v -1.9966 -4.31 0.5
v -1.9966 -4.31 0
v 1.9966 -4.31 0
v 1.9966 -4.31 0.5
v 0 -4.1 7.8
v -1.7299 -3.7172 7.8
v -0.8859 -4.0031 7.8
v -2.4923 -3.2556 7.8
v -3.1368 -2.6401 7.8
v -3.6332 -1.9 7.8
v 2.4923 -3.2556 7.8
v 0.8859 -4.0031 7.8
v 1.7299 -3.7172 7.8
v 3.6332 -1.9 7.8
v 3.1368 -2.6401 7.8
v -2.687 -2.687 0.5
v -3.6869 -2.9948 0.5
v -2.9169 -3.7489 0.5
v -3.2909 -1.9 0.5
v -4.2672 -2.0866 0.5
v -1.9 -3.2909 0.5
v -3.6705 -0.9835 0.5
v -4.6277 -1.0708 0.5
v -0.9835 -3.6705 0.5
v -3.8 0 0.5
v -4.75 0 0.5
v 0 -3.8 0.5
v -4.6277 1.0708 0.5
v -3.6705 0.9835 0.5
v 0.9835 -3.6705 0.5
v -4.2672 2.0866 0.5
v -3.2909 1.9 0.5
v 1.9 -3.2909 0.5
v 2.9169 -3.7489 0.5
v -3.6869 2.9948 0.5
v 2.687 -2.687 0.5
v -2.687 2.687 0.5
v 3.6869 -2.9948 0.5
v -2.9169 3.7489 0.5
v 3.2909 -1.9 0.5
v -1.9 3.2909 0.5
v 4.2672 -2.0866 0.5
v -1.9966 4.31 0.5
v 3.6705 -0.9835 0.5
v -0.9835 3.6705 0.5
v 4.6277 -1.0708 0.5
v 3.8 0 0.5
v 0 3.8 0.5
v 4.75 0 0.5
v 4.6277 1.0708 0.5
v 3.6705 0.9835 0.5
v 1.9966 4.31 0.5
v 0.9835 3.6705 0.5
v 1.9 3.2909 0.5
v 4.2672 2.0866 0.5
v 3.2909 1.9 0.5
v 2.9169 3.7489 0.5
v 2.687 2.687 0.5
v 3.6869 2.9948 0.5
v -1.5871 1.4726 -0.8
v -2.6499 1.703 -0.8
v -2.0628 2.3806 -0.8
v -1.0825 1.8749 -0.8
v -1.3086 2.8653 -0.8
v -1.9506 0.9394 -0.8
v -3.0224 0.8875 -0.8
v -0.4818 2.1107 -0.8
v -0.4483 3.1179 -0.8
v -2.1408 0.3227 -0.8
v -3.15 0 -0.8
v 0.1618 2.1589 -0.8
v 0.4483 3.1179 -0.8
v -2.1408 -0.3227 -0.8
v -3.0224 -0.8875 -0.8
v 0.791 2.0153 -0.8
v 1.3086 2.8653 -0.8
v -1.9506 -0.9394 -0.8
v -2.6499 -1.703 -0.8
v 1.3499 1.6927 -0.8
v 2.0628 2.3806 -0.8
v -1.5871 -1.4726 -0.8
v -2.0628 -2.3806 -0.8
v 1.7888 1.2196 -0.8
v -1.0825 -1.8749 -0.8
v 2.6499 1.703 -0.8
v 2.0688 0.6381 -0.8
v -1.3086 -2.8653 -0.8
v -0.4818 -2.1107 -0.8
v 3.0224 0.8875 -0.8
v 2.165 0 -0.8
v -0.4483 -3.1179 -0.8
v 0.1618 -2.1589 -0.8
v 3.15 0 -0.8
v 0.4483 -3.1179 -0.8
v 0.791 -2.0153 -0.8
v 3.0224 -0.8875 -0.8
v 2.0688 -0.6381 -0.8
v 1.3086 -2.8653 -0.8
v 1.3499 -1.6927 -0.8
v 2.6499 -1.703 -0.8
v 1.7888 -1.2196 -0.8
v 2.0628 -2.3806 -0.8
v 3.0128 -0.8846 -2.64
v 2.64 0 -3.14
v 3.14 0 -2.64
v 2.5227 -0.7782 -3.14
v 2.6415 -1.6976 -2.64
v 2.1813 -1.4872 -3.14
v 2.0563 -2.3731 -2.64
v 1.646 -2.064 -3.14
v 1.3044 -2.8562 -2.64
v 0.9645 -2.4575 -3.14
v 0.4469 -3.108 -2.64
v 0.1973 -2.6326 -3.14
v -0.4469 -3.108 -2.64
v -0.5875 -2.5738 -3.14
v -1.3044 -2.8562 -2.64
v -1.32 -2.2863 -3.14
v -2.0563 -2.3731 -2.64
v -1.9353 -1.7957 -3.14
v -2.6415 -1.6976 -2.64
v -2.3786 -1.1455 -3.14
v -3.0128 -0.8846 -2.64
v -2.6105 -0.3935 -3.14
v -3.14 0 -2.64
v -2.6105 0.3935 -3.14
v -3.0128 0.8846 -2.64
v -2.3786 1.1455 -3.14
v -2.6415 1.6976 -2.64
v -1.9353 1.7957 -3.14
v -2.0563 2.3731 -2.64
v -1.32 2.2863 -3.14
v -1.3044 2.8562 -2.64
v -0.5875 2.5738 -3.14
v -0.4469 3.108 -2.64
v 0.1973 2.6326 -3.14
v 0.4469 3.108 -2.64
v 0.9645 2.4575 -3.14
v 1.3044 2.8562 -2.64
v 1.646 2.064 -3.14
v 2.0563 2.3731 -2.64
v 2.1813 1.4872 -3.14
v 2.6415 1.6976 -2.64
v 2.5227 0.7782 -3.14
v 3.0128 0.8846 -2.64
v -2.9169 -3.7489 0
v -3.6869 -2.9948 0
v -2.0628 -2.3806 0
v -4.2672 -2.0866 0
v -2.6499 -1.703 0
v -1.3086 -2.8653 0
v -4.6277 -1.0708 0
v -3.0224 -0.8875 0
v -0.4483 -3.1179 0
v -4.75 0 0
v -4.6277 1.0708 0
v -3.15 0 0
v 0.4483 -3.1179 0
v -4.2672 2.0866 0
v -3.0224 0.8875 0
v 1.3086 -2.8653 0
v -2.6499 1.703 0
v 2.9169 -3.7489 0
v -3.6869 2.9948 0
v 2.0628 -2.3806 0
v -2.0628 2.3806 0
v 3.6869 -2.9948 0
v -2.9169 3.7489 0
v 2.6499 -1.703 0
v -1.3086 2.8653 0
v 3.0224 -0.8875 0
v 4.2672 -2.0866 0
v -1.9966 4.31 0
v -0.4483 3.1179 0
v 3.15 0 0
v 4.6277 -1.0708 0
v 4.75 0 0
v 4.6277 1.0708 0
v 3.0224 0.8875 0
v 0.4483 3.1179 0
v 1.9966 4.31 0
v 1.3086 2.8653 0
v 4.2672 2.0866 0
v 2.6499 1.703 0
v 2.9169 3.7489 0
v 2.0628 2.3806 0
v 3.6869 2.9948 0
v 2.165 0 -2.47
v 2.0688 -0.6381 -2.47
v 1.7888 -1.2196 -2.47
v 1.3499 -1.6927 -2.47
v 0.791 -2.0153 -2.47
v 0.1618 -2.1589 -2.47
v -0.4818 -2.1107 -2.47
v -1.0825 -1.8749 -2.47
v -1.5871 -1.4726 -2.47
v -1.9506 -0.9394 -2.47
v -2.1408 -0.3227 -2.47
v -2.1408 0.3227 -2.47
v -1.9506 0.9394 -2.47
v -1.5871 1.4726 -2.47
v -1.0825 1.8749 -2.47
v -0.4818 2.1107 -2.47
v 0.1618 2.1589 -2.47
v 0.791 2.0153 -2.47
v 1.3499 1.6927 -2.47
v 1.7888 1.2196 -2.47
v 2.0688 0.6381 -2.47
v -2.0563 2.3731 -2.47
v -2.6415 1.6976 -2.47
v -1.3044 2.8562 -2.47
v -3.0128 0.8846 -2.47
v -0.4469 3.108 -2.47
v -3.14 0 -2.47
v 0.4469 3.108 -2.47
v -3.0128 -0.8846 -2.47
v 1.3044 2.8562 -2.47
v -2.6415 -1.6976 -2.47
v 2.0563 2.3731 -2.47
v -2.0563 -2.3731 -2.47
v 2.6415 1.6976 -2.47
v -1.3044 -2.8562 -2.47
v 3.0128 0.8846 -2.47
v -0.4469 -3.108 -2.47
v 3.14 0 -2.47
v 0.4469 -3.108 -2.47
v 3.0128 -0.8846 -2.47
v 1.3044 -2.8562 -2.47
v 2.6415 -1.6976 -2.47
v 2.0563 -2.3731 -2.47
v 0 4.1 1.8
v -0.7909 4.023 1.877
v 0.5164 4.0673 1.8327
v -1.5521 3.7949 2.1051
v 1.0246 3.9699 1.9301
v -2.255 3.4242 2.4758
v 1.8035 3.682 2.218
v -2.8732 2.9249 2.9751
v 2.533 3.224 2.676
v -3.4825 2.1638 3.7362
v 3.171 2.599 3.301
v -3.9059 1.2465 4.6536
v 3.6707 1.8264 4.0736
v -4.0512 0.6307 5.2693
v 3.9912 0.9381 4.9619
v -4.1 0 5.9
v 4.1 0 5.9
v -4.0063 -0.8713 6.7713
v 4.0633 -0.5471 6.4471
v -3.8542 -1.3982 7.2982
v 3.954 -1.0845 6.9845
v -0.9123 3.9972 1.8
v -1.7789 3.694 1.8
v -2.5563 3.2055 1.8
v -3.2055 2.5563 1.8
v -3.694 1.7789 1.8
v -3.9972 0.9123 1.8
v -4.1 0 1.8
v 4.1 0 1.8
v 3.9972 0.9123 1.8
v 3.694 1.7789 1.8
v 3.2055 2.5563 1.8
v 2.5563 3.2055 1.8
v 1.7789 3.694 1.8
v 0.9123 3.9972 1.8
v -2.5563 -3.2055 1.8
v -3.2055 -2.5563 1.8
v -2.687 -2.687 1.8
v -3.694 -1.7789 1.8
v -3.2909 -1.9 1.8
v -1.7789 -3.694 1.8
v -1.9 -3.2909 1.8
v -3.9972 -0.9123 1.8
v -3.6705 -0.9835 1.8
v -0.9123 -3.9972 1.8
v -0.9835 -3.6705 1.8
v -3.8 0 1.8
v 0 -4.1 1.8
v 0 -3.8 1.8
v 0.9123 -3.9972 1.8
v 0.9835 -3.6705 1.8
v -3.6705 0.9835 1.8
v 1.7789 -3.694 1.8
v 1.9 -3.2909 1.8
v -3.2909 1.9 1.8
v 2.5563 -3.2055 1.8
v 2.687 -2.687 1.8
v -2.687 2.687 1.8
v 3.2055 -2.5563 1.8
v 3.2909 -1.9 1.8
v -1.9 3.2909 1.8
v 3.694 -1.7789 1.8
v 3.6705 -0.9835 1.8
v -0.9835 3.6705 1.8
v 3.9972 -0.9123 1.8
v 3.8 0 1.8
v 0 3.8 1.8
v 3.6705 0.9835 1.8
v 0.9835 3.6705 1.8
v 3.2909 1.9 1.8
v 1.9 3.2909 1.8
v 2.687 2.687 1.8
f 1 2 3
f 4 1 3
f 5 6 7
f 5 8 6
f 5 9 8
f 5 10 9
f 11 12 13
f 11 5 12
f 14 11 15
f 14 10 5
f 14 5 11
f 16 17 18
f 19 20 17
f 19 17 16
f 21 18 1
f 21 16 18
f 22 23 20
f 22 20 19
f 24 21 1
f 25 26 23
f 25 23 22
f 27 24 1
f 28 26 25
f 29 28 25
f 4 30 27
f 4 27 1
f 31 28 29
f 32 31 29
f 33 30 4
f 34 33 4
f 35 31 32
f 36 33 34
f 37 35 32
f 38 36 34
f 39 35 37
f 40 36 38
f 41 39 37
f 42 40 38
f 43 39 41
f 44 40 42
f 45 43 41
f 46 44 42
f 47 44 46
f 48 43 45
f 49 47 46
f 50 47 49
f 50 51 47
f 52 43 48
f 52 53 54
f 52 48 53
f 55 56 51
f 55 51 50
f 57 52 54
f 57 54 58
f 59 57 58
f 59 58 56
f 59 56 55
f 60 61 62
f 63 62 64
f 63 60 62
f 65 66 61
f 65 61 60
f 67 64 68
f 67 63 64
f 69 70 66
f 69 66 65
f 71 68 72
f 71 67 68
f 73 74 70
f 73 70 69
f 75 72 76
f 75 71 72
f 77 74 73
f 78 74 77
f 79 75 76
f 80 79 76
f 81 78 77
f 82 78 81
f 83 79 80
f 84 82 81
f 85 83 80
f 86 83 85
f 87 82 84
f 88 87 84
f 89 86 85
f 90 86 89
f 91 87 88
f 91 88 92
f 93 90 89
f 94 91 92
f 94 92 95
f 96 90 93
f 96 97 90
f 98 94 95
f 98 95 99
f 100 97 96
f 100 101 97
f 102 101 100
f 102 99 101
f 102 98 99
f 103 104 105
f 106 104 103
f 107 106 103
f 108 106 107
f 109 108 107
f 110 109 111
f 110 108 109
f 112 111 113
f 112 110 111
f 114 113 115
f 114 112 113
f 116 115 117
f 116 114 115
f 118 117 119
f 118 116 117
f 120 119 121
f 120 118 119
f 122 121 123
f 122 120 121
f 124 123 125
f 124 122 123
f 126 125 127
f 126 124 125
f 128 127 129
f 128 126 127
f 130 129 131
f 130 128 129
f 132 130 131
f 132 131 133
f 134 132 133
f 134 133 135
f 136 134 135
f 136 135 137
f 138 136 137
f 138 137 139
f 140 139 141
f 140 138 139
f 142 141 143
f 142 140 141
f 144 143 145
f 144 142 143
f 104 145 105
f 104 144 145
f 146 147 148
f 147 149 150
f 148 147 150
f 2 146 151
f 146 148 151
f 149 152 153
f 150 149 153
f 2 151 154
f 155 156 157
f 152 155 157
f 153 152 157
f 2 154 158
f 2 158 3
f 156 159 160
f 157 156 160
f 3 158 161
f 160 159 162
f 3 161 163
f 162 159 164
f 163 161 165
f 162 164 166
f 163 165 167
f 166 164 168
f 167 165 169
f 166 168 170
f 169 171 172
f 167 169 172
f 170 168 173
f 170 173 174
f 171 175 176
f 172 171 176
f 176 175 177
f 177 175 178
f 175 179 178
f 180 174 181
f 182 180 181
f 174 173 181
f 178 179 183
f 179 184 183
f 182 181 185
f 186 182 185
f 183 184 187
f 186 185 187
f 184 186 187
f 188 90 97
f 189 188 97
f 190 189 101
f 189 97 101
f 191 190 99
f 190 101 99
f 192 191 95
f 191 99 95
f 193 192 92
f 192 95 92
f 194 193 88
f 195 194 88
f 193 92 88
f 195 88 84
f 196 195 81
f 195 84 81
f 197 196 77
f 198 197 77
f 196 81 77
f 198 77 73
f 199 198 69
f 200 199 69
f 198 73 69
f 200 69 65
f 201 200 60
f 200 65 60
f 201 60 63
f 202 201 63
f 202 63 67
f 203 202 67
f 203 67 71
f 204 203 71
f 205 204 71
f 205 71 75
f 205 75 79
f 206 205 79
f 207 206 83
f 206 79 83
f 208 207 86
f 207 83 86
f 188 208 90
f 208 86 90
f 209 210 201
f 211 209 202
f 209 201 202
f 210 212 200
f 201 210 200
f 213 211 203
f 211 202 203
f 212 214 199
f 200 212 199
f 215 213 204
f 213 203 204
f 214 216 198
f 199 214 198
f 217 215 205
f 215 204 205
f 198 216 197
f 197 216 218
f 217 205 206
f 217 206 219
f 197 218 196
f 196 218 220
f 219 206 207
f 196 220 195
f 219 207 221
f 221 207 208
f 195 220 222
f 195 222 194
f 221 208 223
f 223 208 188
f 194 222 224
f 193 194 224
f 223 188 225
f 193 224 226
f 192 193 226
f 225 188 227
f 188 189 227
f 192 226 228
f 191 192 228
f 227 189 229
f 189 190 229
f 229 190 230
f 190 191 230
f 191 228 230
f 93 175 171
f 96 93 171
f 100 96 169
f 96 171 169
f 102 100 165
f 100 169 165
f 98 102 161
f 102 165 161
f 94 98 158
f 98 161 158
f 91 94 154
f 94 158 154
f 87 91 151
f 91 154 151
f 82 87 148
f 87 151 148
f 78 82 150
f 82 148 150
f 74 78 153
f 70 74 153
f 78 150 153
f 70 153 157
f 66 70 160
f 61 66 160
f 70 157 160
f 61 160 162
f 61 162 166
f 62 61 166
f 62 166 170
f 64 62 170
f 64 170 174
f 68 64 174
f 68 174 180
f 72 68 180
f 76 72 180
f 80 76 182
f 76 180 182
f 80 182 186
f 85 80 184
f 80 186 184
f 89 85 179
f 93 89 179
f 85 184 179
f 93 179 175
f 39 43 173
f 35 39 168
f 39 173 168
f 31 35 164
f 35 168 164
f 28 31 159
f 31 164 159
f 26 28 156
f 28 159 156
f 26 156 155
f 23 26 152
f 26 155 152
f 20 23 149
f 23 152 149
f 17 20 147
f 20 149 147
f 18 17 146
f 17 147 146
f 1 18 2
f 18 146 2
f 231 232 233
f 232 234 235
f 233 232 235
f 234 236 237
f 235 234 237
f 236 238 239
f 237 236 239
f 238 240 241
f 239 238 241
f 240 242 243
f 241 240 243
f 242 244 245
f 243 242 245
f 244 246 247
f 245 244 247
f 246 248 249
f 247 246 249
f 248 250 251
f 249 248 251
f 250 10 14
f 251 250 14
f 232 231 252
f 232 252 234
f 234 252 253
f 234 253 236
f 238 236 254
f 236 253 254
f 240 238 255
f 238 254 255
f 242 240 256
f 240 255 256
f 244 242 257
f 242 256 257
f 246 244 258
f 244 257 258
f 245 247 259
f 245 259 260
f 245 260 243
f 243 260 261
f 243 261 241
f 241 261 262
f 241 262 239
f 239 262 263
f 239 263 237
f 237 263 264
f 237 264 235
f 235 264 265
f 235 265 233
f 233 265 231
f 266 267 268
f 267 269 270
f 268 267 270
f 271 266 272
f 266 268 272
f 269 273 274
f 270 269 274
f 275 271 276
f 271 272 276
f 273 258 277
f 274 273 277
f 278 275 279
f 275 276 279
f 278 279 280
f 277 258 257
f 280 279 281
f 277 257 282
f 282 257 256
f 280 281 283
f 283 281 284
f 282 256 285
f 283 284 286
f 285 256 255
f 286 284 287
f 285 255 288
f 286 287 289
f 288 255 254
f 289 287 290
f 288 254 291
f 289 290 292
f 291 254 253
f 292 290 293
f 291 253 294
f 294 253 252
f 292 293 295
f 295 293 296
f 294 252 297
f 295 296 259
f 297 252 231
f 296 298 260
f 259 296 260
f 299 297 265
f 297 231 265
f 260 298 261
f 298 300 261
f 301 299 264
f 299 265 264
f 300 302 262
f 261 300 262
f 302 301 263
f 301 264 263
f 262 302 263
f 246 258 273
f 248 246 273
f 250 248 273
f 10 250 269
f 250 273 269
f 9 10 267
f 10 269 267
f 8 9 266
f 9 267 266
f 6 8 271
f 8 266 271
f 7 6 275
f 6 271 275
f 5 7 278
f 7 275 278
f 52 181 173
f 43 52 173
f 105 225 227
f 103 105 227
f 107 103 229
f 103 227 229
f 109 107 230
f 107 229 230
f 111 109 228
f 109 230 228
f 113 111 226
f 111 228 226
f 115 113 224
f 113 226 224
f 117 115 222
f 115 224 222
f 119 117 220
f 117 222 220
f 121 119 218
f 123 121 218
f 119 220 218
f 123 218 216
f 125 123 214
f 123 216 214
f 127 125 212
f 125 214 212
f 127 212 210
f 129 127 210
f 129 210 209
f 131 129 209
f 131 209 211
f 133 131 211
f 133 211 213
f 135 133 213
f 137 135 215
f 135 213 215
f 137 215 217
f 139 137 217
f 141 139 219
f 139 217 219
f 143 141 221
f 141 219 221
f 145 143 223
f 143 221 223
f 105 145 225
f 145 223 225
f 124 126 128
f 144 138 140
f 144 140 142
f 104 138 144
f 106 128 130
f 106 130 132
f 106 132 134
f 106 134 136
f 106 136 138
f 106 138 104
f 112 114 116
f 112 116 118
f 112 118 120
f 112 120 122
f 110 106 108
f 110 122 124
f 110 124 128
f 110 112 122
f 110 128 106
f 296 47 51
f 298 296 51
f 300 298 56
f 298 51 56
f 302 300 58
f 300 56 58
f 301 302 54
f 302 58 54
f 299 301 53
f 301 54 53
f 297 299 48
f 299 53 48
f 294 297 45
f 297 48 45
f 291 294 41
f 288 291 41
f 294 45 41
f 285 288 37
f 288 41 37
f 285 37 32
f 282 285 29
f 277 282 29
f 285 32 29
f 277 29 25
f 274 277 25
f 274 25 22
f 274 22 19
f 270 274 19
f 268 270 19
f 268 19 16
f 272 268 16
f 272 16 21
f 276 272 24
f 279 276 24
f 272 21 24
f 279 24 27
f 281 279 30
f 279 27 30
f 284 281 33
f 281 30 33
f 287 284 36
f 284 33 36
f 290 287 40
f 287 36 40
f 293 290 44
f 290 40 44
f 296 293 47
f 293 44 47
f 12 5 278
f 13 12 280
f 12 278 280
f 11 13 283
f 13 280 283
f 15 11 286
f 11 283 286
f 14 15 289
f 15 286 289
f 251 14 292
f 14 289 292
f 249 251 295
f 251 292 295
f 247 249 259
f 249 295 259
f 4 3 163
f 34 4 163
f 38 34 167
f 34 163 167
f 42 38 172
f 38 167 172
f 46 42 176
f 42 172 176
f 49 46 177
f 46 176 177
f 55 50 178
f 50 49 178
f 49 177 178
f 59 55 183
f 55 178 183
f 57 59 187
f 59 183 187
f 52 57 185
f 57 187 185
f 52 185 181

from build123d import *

# Parameters (mm, degrees)
F0_R      = 4.75
F1_DEPTH  = 0.5
F2_R      = 3.8
F3_DEPTH  = 1.3
F5_DEPTH  = 1.801
F6_R      = 3.15
F7_DEPTH  = 0.8
F8_R      = 2.165
F9_DEPTH  = 1.67
F10_R     = 3.14
F11_DEPTH = 0.67
F12_SIZE  = 0.5
F13_W     = 8.2
F13_H     = 8.2
F13_R     = 3.8
F14_DEPTH = 6
F15_SIZE  = 5.99999
F17_DEPTH = 6.001


# Not quite as in the source:
# - a fillet or chamfer is up to 0.001 mm smaller than in the source, because OpenCascade refuses the exact size


with BuildPart() as f1:
    # F0 (on Top) → F1 (new body)
    with BuildSketch(Plane.XY):
        Circle(F0_R)
    extrude(amount=F1_DEPTH)

    # F2 (on face) → F3 (join)
    with BuildSketch(Plane.XY.offset(0.5)):
        Circle(F2_R)
    extrude(amount=F3_DEPTH)

    # F4 (on face) → F5 (cut, through all)
    with BuildSketch(Plane(origin=(0, 0, 0), x_dir=(1, 0, 0), z_dir=(0, 0, -1))):
        with BuildLine():
            Line((-1.9965971051, 4.31), (0, 4.31))
            Line((0, 4.31), (1.9965971051, 4.31))
            ThreePointArc((1.9965971051, 4.31), (0, 4.75), (-1.9965971051, 4.31))
        make_face()
        with BuildLine():
            Line((0, -4.31), (-1.9965971051, -4.31))
            ThreePointArc((-1.9965971051, -4.31), (0, -4.75), (1.9965971051, -4.31))
            Line((1.9965971051, -4.31), (0, -4.31))
        make_face()
    extrude(amount=-F5_DEPTH, mode=Mode.SUBTRACT)

    # F6 (on face) → F7 (join)
    with BuildSketch(Plane(origin=(0, 0, 0), x_dir=(1, 0, 0), z_dir=(0, 0, -1))):
        Circle(F6_R)
    extrude(amount=F7_DEPTH)

    # F8 (on face) → F9 (join)
    with BuildSketch(Plane(origin=(0, 0, -0.8), x_dir=(1, 0, 0), z_dir=(0, 0, -1))):
        Circle(F8_R)
    extrude(amount=F9_DEPTH)

    # F10 (on face) → F11 (join)
    with BuildSketch(Plane(origin=(0, 0, -2.47), x_dir=(1, 0, 0), z_dir=(0, 0, -1))):
        Circle(F10_R)
    extrude(amount=F11_DEPTH)

    # F12
    f12_edges = [f1.edges().sort_by_distance(p)[0] for p in [
        (-3.14, 0, -3.14),
    ]]
    chamfer(f12_edges, length=F12_SIZE)

    # F13 (on face) → F14 (join)
    with BuildSketch(Plane.XY.offset(1.8)):
        Rectangle(F13_W, F13_H)
        Circle(F13_R, mode=Mode.SUBTRACT)
        Circle(F13_R)
    extrude(amount=F14_DEPTH)

    # F15 (size 6 in the source; OpenCascade refuses exactly that, so slightly less here)
    f15_edges = [f1.edges().sort_by_distance(p)[0] for p in [
        (0, 4.1, 7.8),
    ]]
    chamfer(f15_edges, length=F15_SIZE)

    # F16 (on face) → F17 (cut, through all)
    with BuildSketch(Plane(origin=(0, 0, 1.8), x_dir=(1, 0, 0), z_dir=(0, 0, -1))):
        with BuildLine():
            ThreePointArc((0, 4.1), (2.8991378029, 2.8991378029), (4.1, 0))
            Line((4.1, 0), (4.1, 4.1))
            Line((4.1, 4.1), (0, 4.1))
        make_face()
        with BuildLine():
            Line((4.1, -4.1), (4.1, 0))
            ThreePointArc((4.1, 0), (2.8991378029, -2.8991378029), (0, -4.1))
            Line((0, -4.1), (4.1, -4.1))
        make_face()
        with BuildLine():
            ThreePointArc((-4.1, 0), (-2.8991378029, 2.8991378029), (0, 4.1))
            Line((0, 4.1), (-4.1, 4.1))
            Line((-4.1, 4.1), (-4.1, 0))
        make_face()
        with BuildLine():
            Line((-4.1, -4.1), (0, -4.1))
            ThreePointArc((0, -4.1), (-2.8991378029, -2.8991378029), (-4.1, 0))
            Line((-4.1, 0), (-4.1, -4.1))
        make_face()
    extrude(amount=-F17_DEPTH, mode=Mode.SUBTRACT)


solid = f1.part
